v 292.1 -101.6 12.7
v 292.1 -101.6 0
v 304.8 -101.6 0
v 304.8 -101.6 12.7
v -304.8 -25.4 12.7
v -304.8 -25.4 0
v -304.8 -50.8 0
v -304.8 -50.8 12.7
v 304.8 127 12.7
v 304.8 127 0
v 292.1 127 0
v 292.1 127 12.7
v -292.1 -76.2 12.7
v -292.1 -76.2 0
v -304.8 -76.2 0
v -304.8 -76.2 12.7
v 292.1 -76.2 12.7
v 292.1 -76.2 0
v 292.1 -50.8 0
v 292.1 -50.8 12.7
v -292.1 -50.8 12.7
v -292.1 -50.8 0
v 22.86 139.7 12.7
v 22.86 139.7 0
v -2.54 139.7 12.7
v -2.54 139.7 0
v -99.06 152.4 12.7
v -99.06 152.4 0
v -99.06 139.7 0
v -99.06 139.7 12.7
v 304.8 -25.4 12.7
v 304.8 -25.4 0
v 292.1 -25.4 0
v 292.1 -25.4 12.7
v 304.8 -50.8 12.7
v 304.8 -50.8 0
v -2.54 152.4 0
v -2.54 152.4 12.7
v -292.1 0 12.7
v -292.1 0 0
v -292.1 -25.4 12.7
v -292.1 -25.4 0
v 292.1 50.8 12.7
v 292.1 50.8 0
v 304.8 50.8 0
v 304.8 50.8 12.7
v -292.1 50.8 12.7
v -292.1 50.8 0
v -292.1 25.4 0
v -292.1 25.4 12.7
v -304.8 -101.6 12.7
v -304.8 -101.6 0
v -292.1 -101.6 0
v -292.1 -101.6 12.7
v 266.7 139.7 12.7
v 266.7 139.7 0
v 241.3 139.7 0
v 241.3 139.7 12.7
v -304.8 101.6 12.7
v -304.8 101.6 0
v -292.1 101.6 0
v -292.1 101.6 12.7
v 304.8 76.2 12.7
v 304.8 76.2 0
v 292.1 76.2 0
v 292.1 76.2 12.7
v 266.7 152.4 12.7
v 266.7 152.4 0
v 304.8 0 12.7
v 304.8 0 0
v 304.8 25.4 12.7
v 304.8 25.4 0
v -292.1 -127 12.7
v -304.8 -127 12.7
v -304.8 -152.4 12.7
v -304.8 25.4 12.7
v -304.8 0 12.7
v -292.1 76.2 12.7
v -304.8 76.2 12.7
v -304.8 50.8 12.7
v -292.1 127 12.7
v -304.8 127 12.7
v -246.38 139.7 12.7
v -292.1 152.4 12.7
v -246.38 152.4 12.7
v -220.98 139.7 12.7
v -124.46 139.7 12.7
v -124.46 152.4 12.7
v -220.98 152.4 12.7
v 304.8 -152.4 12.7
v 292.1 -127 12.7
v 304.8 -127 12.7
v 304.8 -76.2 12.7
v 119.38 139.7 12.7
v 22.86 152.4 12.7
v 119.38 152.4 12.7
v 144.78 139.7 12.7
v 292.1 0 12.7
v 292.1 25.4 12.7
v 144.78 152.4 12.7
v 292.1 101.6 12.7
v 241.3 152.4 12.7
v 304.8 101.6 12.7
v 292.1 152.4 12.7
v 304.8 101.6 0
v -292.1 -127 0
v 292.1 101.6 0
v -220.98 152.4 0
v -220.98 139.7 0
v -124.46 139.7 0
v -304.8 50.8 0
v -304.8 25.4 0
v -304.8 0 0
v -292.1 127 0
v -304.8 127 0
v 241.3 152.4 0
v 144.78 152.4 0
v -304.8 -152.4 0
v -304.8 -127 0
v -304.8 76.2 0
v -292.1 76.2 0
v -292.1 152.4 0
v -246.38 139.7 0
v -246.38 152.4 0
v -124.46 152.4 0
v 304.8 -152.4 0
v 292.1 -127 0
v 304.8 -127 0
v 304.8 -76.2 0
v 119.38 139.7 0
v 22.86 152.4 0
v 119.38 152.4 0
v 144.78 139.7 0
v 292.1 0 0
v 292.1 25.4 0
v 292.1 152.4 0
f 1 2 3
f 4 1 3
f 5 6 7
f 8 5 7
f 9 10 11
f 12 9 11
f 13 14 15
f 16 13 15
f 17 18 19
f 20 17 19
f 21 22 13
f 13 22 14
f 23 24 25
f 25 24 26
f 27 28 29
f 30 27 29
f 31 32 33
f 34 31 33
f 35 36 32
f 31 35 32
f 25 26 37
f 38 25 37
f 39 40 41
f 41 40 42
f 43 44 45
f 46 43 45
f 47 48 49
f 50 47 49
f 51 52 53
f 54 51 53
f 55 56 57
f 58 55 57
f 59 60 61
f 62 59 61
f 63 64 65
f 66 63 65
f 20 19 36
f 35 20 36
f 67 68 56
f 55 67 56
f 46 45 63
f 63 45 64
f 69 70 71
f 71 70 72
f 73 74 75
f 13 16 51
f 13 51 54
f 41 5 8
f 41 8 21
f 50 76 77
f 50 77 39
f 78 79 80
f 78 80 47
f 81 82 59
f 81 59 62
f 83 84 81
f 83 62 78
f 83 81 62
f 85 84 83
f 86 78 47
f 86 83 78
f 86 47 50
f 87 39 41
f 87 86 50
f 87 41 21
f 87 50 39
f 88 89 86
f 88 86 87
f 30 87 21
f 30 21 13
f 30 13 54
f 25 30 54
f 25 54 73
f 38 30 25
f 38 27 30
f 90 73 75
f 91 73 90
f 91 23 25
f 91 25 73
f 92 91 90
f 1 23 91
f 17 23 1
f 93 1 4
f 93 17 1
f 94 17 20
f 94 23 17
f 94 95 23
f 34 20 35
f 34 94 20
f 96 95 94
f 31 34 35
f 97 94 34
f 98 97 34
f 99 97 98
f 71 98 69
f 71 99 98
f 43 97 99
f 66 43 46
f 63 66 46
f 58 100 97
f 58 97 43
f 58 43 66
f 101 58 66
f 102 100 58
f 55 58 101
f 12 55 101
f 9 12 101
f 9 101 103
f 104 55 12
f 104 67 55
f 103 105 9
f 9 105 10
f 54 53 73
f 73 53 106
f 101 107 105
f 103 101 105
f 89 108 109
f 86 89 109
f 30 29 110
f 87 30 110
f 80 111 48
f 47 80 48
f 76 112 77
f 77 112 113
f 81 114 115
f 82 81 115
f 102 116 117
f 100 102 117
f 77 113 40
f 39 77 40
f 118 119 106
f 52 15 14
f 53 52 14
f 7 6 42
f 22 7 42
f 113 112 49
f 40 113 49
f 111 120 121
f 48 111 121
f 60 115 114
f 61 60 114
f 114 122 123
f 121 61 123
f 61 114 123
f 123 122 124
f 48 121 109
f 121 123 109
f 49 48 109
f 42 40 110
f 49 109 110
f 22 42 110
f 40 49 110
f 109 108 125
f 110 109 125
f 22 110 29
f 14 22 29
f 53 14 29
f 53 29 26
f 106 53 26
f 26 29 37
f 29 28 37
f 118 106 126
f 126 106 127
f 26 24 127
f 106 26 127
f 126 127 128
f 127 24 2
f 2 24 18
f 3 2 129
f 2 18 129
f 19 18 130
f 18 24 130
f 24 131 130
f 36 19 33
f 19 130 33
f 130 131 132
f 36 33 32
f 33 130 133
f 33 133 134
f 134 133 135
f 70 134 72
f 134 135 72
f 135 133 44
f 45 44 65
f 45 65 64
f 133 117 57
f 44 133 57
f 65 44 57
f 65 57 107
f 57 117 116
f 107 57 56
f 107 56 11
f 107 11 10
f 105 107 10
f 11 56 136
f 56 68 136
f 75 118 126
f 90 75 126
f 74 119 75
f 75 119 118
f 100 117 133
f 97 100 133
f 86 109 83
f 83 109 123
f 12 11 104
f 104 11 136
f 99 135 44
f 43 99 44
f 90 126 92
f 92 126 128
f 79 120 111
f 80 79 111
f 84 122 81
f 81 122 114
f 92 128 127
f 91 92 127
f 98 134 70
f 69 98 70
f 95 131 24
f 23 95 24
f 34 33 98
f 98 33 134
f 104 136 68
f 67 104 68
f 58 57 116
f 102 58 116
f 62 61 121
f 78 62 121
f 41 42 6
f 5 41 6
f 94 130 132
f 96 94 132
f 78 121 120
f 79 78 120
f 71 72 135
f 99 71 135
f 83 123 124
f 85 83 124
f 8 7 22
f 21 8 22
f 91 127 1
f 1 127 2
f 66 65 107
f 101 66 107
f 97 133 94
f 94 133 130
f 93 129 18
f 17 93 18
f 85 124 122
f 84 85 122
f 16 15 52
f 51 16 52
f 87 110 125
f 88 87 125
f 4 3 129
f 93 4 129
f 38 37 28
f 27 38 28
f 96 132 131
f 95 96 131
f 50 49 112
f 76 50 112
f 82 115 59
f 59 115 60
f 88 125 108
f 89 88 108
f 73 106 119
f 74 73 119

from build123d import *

# Parameters (mm, degrees)
F1_DEPTH = 12.7


with BuildPart() as f1:
    # F0 (on Top) → F1 (new body)
    with BuildSketch(Plane.XY):
        Polygon((-246.38, 152.4), (-292.1, 152.4), (-292.1, 127), (-304.8, 127), (-304.8, 101.6), (-292.1, 101.6), (-292.1, 76.2), (-304.8, 76.2), (-304.8, 50.8), (-292.1, 50.8), (-292.1, 25.4), (-304.8, 25.4), (-304.8, 0), (-292.1, 0), (-292.1, -25.4), (-304.8, -25.4), (-304.8, -50.8), (-292.1, -50.8), (-292.1, -76.2), (-304.8, -76.2), (-304.8, -101.6), (-292.1, -101.6), (-292.1, -127), (-304.8, -127), (-304.8, -152.4), (304.8, -152.4), (304.8, -127), (292.1, -127), (292.1, -101.6), (304.8, -101.6), (304.8, -76.2), (292.1, -76.2), (292.1, -50.8), (304.8, -50.8), (304.8, -25.4), (292.1, -25.4), (292.1, 0), (304.8, 0), (304.8, 25.4), (292.1, 25.4), (292.1, 50.8), (304.8, 50.8), (304.8, 76.2), (292.1, 76.2), (292.1, 101.6), (304.8, 101.6), (304.8, 127), (292.1, 127), (292.1, 152.4), (266.7, 152.4), (266.7, 139.7), (241.3, 139.7), (241.3, 152.4), (144.78, 152.4), (144.78, 139.7), (119.38, 139.7), (119.38, 152.4), (22.86, 152.4), (22.86, 139.7), (-2.54, 139.7), (-2.54, 152.4), (-99.06, 152.4), (-99.06, 139.7), (-124.46, 139.7), (-124.46, 152.4), (-220.98, 152.4), (-220.98, 139.7), (-246.38, 139.7), align=None)
    extrude(amount=F1_DEPTH)


solid = f1.part
